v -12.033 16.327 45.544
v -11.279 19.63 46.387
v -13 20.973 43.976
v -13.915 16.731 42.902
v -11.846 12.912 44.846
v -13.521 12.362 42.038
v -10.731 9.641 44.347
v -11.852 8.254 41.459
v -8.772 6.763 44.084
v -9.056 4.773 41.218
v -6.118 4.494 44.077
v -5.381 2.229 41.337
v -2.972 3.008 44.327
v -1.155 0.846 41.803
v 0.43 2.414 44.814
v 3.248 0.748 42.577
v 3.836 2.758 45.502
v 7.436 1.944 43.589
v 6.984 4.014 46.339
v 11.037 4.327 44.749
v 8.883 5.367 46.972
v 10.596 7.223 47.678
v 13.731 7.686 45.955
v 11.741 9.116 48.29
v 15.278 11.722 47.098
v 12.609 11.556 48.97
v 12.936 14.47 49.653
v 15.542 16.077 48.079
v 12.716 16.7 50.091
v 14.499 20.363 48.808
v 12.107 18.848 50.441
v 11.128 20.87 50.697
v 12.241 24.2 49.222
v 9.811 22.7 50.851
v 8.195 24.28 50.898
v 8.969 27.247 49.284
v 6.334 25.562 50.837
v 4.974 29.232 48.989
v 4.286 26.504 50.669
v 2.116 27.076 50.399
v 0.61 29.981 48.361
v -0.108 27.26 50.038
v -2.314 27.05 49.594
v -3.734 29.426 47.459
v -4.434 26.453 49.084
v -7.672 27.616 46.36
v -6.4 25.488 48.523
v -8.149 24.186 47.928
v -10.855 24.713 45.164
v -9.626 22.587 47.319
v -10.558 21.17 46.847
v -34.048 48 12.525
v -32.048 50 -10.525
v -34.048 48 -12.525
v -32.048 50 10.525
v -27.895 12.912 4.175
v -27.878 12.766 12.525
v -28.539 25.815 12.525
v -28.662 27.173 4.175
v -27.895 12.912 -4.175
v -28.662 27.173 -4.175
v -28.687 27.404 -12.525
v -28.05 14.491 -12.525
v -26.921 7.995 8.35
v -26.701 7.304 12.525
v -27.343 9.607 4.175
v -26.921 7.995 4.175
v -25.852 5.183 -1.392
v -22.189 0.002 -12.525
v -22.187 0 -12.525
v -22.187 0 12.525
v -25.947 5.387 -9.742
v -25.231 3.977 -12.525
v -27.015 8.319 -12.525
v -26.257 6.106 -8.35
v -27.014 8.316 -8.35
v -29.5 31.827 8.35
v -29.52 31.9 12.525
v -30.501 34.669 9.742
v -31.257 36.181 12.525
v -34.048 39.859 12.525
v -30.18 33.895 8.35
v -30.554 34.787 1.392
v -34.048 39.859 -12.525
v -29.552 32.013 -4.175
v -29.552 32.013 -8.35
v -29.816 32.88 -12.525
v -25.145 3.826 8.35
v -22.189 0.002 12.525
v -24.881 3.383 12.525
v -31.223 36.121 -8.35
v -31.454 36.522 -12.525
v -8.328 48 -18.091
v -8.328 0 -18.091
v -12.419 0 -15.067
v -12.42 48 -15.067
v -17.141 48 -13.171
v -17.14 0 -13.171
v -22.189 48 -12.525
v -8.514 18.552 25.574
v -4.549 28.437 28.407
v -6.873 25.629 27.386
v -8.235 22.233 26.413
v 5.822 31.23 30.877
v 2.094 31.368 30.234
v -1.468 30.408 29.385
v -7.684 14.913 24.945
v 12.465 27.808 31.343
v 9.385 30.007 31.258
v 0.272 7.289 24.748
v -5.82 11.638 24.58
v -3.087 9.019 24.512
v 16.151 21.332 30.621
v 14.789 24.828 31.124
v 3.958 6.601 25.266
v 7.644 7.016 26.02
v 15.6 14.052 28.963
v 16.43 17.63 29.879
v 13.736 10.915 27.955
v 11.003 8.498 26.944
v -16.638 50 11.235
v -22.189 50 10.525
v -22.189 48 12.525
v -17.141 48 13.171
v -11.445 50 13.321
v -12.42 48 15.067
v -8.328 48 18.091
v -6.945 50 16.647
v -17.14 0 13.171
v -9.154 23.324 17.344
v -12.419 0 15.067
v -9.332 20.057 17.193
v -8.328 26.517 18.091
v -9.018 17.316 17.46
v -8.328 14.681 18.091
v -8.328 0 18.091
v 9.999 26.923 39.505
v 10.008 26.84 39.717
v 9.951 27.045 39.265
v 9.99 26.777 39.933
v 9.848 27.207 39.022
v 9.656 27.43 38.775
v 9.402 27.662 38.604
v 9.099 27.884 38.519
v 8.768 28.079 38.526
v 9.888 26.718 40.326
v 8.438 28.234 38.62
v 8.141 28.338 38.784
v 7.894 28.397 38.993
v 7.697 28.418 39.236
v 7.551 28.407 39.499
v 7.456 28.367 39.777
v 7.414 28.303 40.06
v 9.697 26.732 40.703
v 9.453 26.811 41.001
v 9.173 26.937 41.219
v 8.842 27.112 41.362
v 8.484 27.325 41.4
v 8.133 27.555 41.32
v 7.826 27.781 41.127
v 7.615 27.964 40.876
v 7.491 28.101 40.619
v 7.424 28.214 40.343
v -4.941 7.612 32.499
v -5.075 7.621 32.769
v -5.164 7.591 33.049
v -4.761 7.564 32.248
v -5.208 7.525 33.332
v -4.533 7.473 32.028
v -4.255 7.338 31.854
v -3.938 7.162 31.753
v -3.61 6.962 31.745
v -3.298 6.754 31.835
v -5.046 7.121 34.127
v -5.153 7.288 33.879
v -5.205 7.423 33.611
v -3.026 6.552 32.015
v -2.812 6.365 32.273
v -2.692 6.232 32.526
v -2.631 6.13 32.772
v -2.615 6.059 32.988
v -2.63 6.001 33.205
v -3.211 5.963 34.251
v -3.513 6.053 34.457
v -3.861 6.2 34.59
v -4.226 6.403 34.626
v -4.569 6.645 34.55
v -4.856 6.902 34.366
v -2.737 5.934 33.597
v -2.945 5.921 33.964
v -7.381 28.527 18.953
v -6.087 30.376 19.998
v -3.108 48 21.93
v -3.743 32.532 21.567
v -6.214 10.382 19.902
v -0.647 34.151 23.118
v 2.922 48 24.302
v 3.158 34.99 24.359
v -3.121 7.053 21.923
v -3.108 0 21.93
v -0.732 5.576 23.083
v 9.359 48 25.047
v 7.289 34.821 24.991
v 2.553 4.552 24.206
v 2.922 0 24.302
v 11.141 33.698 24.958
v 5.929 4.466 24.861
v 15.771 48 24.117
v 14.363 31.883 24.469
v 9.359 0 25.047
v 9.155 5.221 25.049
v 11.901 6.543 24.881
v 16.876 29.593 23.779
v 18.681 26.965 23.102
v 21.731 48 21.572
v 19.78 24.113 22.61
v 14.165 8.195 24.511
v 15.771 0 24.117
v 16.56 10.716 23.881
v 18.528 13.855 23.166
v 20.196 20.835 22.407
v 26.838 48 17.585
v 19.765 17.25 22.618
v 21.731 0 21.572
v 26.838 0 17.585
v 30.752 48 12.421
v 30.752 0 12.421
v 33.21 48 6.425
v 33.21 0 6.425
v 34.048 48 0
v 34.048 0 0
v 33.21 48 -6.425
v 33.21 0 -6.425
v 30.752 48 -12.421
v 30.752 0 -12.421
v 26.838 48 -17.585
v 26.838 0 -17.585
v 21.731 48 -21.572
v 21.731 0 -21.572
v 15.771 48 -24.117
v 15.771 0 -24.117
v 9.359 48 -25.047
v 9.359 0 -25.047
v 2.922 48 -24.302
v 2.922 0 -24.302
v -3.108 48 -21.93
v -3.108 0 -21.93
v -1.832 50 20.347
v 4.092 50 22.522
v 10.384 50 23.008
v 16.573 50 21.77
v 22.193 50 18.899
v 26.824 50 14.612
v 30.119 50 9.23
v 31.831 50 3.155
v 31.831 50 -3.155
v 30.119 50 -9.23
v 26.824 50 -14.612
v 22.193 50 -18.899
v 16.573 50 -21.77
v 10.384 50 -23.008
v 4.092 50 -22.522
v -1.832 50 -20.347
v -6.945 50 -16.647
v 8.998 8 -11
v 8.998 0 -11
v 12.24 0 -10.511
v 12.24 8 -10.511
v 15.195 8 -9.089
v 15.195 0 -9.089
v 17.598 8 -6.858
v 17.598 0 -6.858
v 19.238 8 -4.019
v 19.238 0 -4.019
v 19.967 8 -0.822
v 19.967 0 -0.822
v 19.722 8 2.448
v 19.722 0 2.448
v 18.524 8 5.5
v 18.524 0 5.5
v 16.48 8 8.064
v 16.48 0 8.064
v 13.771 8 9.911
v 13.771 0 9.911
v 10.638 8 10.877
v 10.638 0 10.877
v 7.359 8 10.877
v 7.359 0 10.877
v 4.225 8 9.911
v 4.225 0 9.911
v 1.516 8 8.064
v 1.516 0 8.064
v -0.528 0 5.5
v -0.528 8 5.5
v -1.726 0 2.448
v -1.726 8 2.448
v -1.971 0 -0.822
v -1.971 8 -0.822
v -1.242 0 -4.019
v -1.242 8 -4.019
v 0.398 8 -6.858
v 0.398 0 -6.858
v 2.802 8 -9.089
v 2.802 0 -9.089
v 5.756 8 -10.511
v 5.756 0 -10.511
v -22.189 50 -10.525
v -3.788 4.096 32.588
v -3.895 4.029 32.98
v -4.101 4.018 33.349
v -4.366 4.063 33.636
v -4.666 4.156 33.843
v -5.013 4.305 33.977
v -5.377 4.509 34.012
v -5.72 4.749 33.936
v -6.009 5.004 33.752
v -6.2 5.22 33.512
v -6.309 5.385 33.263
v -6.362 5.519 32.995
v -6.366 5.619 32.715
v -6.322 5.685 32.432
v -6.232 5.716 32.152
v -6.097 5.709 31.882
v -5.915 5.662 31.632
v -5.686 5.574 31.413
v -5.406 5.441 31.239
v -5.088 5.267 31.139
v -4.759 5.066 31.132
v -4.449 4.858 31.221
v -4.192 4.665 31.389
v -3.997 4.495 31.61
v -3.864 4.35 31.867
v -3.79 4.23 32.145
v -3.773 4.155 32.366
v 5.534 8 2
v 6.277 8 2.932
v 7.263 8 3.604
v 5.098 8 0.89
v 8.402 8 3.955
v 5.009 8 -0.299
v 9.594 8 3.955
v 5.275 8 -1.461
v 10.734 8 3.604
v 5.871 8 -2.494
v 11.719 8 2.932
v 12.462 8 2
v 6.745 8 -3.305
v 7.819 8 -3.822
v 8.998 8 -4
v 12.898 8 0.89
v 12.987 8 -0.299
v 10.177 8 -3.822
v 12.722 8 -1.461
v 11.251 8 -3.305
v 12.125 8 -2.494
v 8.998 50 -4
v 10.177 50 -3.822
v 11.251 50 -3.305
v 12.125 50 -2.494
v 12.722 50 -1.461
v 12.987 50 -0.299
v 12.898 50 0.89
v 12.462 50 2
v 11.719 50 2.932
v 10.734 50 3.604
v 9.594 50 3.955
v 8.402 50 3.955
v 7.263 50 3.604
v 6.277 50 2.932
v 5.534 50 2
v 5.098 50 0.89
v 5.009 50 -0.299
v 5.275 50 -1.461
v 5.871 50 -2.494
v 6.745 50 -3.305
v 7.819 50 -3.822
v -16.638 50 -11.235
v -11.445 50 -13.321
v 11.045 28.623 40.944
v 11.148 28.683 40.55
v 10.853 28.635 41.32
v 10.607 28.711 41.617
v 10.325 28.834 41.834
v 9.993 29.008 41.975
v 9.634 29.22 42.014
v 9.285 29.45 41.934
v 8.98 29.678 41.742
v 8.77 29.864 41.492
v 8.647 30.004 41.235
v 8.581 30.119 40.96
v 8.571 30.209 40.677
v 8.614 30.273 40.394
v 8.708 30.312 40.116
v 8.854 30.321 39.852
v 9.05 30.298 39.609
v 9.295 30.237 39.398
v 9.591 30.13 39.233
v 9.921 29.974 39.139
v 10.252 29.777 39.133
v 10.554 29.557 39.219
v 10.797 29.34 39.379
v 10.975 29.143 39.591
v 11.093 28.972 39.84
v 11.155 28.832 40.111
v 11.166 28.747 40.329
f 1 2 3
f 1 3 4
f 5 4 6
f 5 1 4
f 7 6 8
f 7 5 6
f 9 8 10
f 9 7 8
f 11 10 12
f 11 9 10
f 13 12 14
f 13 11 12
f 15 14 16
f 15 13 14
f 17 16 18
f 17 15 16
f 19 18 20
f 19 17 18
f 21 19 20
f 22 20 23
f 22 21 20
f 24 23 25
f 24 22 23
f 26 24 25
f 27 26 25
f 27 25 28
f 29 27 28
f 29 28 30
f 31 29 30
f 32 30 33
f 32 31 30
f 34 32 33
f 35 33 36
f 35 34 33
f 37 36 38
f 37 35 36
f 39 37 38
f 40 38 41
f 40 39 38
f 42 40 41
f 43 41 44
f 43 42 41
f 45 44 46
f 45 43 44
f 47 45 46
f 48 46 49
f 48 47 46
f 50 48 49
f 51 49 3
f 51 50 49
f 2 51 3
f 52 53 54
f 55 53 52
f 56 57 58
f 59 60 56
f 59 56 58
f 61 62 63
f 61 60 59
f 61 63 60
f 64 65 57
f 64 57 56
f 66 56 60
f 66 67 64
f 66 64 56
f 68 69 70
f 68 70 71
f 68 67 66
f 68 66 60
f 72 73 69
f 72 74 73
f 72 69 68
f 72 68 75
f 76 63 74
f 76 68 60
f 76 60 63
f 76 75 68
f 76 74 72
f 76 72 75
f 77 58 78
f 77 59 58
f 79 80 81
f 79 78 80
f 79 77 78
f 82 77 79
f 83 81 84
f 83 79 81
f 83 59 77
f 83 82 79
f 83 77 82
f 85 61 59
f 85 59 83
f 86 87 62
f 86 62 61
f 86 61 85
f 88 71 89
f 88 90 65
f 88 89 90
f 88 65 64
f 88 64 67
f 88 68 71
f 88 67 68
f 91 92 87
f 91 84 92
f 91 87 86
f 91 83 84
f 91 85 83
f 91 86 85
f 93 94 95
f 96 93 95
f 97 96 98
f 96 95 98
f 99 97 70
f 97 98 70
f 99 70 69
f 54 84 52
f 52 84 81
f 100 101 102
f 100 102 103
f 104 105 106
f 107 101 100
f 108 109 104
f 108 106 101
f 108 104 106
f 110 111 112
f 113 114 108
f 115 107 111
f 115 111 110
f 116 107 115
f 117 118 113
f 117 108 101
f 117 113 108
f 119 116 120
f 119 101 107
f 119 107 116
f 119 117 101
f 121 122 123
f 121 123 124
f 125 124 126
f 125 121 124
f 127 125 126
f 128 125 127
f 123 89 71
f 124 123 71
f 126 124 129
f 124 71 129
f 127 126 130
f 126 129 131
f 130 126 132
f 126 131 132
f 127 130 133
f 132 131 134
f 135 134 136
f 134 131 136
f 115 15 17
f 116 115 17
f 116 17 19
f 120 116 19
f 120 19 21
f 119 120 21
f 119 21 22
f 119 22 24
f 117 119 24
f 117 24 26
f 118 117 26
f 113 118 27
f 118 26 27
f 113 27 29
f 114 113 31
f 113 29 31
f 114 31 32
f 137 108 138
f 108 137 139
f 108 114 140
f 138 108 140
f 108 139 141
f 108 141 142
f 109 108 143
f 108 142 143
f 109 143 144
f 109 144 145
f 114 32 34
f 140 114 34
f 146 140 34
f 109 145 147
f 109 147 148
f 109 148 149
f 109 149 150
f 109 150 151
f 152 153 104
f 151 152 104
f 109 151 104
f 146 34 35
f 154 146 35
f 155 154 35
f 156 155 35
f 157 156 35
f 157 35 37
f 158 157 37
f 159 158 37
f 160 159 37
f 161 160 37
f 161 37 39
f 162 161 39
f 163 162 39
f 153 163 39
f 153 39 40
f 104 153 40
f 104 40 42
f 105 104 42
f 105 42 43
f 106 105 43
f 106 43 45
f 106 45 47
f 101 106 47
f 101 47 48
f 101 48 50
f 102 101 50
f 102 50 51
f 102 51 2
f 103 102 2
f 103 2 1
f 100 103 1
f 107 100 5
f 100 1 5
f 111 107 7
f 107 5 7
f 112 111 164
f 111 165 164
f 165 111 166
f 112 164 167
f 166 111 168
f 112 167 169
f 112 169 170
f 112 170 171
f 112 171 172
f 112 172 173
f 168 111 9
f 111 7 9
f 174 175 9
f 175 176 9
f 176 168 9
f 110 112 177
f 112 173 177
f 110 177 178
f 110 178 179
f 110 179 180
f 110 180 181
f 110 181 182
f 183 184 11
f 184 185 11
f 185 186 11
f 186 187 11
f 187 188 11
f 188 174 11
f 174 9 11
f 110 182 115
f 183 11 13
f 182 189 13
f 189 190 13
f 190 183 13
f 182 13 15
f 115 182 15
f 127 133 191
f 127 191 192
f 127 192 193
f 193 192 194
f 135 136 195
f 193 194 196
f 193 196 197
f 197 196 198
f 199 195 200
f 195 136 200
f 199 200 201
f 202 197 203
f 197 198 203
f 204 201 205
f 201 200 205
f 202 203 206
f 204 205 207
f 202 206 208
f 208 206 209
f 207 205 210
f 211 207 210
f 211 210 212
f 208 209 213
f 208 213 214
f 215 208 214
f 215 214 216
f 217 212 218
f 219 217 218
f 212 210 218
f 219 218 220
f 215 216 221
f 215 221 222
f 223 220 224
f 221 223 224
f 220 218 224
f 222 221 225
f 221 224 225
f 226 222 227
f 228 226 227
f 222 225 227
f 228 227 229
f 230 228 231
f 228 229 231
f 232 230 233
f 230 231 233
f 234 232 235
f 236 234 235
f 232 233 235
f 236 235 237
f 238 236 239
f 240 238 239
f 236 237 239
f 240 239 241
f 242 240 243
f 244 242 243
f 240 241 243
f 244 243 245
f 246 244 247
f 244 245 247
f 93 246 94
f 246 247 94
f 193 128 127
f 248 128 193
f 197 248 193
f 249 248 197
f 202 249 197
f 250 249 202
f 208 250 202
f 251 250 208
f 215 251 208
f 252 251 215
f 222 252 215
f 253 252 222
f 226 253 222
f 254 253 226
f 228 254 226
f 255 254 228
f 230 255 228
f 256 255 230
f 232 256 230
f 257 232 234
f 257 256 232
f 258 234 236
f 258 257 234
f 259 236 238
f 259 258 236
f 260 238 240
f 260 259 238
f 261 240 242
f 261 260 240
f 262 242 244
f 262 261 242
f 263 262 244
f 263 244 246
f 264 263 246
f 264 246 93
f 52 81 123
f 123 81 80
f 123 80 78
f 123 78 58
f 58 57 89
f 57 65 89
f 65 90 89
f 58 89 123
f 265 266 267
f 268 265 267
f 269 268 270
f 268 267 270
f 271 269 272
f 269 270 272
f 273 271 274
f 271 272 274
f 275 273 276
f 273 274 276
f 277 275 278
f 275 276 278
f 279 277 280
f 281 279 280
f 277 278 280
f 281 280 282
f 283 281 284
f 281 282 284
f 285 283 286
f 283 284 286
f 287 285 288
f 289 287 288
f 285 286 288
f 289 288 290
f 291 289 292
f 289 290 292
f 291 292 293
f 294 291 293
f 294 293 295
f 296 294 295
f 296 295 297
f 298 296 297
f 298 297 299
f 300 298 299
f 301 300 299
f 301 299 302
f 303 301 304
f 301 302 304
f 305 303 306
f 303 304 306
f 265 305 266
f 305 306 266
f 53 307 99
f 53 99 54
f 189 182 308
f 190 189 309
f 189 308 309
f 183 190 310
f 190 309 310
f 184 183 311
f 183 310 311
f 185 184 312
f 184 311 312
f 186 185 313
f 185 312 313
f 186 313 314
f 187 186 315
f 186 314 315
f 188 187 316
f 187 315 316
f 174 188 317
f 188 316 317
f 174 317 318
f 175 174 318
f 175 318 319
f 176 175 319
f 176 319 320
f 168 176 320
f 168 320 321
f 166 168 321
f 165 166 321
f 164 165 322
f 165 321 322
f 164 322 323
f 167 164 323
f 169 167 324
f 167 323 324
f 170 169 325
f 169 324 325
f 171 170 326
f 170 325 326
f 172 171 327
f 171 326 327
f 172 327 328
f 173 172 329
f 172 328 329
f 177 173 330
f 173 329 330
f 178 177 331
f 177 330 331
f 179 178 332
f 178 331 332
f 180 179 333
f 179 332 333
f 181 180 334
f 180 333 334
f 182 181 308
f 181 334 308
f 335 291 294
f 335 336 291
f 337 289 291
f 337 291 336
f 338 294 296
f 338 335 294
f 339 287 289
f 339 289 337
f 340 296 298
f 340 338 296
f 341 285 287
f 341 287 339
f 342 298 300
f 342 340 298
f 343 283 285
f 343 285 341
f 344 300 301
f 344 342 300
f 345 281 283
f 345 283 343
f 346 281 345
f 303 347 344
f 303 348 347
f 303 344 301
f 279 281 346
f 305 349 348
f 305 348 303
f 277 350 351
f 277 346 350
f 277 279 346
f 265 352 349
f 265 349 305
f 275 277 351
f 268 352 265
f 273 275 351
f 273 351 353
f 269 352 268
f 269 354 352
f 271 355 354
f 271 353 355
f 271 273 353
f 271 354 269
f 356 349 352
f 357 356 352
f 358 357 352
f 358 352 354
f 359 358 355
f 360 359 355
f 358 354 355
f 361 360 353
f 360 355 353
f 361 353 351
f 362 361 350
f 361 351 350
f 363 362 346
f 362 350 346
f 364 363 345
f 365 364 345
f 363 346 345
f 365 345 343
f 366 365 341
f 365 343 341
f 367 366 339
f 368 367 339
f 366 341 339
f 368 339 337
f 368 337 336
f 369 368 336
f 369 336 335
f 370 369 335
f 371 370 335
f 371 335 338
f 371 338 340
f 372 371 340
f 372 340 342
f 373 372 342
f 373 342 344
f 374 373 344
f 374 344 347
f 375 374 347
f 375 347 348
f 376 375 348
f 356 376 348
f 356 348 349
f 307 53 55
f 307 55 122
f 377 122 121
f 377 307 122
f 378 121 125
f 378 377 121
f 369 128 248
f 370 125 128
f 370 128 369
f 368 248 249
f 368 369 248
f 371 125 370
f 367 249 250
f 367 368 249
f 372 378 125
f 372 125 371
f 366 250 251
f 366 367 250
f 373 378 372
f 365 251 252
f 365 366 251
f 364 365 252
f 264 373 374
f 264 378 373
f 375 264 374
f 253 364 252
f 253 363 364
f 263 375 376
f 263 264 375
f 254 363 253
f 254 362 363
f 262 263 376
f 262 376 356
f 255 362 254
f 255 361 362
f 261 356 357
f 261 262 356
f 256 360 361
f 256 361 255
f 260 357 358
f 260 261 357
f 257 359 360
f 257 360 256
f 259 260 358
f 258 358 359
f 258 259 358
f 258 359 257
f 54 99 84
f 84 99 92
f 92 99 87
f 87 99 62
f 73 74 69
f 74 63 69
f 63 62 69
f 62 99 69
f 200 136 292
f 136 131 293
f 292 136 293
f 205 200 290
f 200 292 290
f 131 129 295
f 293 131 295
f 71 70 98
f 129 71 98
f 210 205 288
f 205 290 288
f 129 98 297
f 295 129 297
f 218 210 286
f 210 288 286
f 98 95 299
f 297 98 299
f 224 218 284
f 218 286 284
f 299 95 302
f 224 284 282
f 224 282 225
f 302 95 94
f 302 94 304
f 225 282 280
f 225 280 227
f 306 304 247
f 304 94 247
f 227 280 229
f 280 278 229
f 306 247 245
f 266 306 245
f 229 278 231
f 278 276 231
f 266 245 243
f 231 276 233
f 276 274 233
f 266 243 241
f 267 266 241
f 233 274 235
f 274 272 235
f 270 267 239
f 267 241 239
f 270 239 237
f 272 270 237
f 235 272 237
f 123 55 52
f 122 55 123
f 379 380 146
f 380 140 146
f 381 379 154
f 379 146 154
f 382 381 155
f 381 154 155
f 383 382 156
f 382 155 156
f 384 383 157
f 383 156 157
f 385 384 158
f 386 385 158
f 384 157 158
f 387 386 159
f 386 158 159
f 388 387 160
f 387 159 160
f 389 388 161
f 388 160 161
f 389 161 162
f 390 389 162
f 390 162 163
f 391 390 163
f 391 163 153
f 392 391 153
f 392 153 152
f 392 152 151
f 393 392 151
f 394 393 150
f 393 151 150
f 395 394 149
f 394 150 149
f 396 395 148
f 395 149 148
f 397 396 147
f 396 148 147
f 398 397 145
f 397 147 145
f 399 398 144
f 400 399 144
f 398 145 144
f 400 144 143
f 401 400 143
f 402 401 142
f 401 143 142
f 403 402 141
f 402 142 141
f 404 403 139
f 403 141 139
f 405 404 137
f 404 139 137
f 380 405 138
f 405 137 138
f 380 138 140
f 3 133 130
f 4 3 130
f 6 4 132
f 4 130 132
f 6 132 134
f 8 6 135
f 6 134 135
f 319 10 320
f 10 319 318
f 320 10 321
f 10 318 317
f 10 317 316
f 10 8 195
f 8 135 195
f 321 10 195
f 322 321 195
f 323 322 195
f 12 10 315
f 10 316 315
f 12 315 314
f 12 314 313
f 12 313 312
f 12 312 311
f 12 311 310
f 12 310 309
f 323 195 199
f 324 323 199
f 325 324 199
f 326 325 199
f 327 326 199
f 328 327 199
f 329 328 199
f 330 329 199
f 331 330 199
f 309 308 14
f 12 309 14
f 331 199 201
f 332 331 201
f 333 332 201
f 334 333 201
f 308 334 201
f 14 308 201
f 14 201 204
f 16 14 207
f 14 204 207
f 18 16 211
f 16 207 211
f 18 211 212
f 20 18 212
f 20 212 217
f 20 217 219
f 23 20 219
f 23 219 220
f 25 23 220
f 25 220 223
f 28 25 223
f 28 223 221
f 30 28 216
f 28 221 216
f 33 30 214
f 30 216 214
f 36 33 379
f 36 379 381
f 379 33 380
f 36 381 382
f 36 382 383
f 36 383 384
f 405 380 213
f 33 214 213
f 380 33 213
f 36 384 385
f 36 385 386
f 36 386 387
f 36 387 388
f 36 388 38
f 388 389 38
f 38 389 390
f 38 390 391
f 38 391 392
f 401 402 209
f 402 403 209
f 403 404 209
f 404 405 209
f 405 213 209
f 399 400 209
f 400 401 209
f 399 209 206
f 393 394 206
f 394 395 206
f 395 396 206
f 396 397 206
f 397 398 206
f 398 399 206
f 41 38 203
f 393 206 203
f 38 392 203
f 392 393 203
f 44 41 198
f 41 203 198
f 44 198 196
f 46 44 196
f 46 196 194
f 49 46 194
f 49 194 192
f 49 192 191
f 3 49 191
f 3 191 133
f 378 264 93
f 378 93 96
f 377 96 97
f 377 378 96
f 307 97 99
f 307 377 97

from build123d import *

# Parameters (mm, degrees)
BOSS_EXTRUDE2_DEPTH = 50
CHAMFER1_SIZE       = 2
SKETCH3_R           = 15
BOSS_EXTRUDE3_DEPTH = 50
SKETCH5_R           = 12.7
CUT_EXTRUDE1_DEPTH  = 21
CHAMFER2_SIZE       = 3
SKETCH6_R           = 1.5
CUT_EXTRUDE2_DEPTH  = 48.5
SKETCH7_R           = 4
CUT_EXTRUDE3_DEPTH  = 82
SKETCH9_R           = 11
CUT_EXTRUDE4_DEPTH  = 8
CHAMFER3_SIZE       = 2
CUT_EXTRUDE5_DEPTH  = 96


with BuildPart() as part:
    # Sketch1 → Boss-Extrude2 (new body)
    with BuildSketch(Plane(origin=(0, 0, 0), x_dir=(1, 0, 0), z_dir=(0, 1, 0))):
        with BuildLine():
            Line((-34.047744375, -12.524843262), (-22.18855037, -12.524843262))
            ThreePointArc((-22.18855037, -12.524843262), (-14.720176785, -13.968492225), (-8.327835606, -18.091440268))
            ThreePointArc((-8.327835606, -18.091440268), (34.047744375, 0), (-8.327835606, 18.091440268))
            ThreePointArc((-8.327835606, 18.091440268), (-14.720176785, 13.968492225), (-22.18855037, 12.524843262))
            Line((-22.18855037, 12.524843262), (-34.047744375, 12.524843262))
            Line((-34.047744375, 12.524843262), (-34.047744375, -12.524843262))
        make_face()
    extrude(amount=BOSS_EXTRUDE2_DEPTH)

    # Chamfer1
    chamfer1_edges = [part.edges().sort_by_distance(p)[0] for p in [
        (-14.720176785, 50, 13.968492225),
        (34.047744375, 50, 0),
        (-14.720176785, 50, -13.968492225),
        (-28.118147372, 50, -12.524843262),
        (-28.118147372, 50, 12.524843262),
    ]]
    chamfer(chamfer1_edges, length=CHAMFER1_SIZE)

    # Sketch3 → Boss-Extrude3 (add)
    with BuildSketch(Plane(origin=(8.99805785, 25, 0), x_dir=(0.9847817818042102, -0.03725406297903357, 0.1697556391348433), z_dir=(-0.17379325152773012, -0.2062305980482824, 0.9629459206788651))):
        with Locations(Location((0, 0, 0), (0, 0, 159.473102118))):
            Circle(SKETCH3_R)
    extrude(amount=BOSS_EXTRUDE3_DEPTH)

    # Sketch5 → Cut-Extrude1 (cut)
    with BuildSketch(Plane(origin=(-7.521847234, -8.925749647, 41.676716708), x_dir=(0.9847817818042102, -0.03725406297903372, 0.16975563913484326), z_dir=(-0.17379325152773012, -0.2062305980482824, 0.9629459206788651))):
        with Locations(Location((7.929771868, 24.45263149, 0), (0, 0, 270.050317468))):
            Circle(SKETCH5_R)
    extrude(amount=-CUT_EXTRUDE1_DEPTH, mode=Mode.SUBTRACT)

    # Chamfer2
    # the kernel refuses this chamfer: 3 mm, written as the material it takes off along each edge
    with BuildSketch(Plane(origin=(0.308395273, 14.688470098, 48.147296034), x_dir=(-0.9219524467114961, 0.37774931122051036, -0.08549353118871512), z_dir=(0.3461207762127333, 0.9026485463906081, 0.255785085516762))) as chamfer2_piece_1:
        Polygon((15, -CHAMFER2_SIZE), (15 - CHAMFER2_SIZE, 0), (15, 0), align=None)
    revolve(axis=Axis((0.308395273, 14.688470098, 48.147296034), (-0.17379325152773012, -0.20623059804828237, 0.9629459206788651)), mode=Mode.SUBTRACT)

    # Sketch6 → Cut-Extrude2 (cut, symmetric)
    with BuildSketch(Plane(origin=(-22.18855037, 48, -12.524843262), x_dir=(-0.8657900557986787, 0.47372232177796453, 0.16122884707587404), z_dir=(-0.500365768548969, -0.82370873989167, -0.26671709635956337))):
        with Locations(Location((-27.977220625, -56.414440492, 0), (0, 0, 189.630227826))):
            Circle(SKETCH6_R)
    extrude(amount=CUT_EXTRUDE2_DEPTH, both=True, mode=Mode.SUBTRACT)

    # Sketch7 → Cut-Extrude3 (cut)
    with BuildSketch(Plane(origin=(0, 0, 0), x_dir=(-1, 0, 0), z_dir=(0, -1, 0))):
        with Locations(Location((-8.99805785, 0, 0), (0, 0, 90))):
            Circle(SKETCH7_R)
    extrude(amount=-CUT_EXTRUDE3_DEPTH, mode=Mode.SUBTRACT)

    # Sketch9 → Cut-Extrude4 (cut)
    with BuildSketch(Plane.XZ):
        with Locations(Location((8.99805785, 0, 0), (0, 0, 270))):
            Circle(SKETCH9_R)
    extrude(amount=-CUT_EXTRUDE4_DEPTH, mode=Mode.SUBTRACT)

    # Chamfer3
    chamfer3_edges = [part.edges().sort_by_distance(p)[0] for p in [
        (-34.047744375, 50, 0),
    ]]
    chamfer(chamfer3_edges, length=CHAMFER3_SIZE)

    # Sketch10 → Cut-Extrude5 (cut)
    with BuildSketch(Plane(origin=(0, 0, -12.524843262), x_dir=(-1, 0, 0), z_dir=(0, 0, -1))):
        with BuildLine():
            Line((22.186659572, 0), (34.047744375, 0))
            Line((34.047744375, 0), (34.047744375, 39.859182783))
            add(Edge.make_bspline(
                [(22.186659572, 0), (33.554101307, 11.263767606), (23.164669735, 28.934314706), (34.047744375, 39.859182783)],
                knots=[0, 0, 0, 0, 1, 1, 1, 1], degree=3))
        make_face()
    extrude(amount=-CUT_EXTRUDE5_DEPTH, mode=Mode.SUBTRACT)


solid = part.part
